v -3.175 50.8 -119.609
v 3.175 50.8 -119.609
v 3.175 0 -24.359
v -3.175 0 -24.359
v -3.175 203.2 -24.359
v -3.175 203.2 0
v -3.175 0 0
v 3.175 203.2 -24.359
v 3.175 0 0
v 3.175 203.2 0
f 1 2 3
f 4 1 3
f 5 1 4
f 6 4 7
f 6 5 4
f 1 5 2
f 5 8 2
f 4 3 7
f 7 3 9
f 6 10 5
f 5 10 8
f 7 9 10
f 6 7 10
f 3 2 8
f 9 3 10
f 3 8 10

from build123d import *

# Parameters (mm, degrees)
BOSS_EXTRUDE1_DEPTH = 3.175


with BuildPart() as part:
    # Sketch1 → Boss-Extrude1 (new body, symmetric)
    with BuildSketch(Plane(origin=(0, 0, 0), x_dir=(0, 0, -1), z_dir=(1, 0, 0))):
        Polygon((0, 0), (0, 203.2), (24.3586, 203.2), (119.6086, 50.8), (24.3586, 0), align=None)
    extrude(amount=BOSS_EXTRUDE1_DEPTH, both=True)


solid = part.part
